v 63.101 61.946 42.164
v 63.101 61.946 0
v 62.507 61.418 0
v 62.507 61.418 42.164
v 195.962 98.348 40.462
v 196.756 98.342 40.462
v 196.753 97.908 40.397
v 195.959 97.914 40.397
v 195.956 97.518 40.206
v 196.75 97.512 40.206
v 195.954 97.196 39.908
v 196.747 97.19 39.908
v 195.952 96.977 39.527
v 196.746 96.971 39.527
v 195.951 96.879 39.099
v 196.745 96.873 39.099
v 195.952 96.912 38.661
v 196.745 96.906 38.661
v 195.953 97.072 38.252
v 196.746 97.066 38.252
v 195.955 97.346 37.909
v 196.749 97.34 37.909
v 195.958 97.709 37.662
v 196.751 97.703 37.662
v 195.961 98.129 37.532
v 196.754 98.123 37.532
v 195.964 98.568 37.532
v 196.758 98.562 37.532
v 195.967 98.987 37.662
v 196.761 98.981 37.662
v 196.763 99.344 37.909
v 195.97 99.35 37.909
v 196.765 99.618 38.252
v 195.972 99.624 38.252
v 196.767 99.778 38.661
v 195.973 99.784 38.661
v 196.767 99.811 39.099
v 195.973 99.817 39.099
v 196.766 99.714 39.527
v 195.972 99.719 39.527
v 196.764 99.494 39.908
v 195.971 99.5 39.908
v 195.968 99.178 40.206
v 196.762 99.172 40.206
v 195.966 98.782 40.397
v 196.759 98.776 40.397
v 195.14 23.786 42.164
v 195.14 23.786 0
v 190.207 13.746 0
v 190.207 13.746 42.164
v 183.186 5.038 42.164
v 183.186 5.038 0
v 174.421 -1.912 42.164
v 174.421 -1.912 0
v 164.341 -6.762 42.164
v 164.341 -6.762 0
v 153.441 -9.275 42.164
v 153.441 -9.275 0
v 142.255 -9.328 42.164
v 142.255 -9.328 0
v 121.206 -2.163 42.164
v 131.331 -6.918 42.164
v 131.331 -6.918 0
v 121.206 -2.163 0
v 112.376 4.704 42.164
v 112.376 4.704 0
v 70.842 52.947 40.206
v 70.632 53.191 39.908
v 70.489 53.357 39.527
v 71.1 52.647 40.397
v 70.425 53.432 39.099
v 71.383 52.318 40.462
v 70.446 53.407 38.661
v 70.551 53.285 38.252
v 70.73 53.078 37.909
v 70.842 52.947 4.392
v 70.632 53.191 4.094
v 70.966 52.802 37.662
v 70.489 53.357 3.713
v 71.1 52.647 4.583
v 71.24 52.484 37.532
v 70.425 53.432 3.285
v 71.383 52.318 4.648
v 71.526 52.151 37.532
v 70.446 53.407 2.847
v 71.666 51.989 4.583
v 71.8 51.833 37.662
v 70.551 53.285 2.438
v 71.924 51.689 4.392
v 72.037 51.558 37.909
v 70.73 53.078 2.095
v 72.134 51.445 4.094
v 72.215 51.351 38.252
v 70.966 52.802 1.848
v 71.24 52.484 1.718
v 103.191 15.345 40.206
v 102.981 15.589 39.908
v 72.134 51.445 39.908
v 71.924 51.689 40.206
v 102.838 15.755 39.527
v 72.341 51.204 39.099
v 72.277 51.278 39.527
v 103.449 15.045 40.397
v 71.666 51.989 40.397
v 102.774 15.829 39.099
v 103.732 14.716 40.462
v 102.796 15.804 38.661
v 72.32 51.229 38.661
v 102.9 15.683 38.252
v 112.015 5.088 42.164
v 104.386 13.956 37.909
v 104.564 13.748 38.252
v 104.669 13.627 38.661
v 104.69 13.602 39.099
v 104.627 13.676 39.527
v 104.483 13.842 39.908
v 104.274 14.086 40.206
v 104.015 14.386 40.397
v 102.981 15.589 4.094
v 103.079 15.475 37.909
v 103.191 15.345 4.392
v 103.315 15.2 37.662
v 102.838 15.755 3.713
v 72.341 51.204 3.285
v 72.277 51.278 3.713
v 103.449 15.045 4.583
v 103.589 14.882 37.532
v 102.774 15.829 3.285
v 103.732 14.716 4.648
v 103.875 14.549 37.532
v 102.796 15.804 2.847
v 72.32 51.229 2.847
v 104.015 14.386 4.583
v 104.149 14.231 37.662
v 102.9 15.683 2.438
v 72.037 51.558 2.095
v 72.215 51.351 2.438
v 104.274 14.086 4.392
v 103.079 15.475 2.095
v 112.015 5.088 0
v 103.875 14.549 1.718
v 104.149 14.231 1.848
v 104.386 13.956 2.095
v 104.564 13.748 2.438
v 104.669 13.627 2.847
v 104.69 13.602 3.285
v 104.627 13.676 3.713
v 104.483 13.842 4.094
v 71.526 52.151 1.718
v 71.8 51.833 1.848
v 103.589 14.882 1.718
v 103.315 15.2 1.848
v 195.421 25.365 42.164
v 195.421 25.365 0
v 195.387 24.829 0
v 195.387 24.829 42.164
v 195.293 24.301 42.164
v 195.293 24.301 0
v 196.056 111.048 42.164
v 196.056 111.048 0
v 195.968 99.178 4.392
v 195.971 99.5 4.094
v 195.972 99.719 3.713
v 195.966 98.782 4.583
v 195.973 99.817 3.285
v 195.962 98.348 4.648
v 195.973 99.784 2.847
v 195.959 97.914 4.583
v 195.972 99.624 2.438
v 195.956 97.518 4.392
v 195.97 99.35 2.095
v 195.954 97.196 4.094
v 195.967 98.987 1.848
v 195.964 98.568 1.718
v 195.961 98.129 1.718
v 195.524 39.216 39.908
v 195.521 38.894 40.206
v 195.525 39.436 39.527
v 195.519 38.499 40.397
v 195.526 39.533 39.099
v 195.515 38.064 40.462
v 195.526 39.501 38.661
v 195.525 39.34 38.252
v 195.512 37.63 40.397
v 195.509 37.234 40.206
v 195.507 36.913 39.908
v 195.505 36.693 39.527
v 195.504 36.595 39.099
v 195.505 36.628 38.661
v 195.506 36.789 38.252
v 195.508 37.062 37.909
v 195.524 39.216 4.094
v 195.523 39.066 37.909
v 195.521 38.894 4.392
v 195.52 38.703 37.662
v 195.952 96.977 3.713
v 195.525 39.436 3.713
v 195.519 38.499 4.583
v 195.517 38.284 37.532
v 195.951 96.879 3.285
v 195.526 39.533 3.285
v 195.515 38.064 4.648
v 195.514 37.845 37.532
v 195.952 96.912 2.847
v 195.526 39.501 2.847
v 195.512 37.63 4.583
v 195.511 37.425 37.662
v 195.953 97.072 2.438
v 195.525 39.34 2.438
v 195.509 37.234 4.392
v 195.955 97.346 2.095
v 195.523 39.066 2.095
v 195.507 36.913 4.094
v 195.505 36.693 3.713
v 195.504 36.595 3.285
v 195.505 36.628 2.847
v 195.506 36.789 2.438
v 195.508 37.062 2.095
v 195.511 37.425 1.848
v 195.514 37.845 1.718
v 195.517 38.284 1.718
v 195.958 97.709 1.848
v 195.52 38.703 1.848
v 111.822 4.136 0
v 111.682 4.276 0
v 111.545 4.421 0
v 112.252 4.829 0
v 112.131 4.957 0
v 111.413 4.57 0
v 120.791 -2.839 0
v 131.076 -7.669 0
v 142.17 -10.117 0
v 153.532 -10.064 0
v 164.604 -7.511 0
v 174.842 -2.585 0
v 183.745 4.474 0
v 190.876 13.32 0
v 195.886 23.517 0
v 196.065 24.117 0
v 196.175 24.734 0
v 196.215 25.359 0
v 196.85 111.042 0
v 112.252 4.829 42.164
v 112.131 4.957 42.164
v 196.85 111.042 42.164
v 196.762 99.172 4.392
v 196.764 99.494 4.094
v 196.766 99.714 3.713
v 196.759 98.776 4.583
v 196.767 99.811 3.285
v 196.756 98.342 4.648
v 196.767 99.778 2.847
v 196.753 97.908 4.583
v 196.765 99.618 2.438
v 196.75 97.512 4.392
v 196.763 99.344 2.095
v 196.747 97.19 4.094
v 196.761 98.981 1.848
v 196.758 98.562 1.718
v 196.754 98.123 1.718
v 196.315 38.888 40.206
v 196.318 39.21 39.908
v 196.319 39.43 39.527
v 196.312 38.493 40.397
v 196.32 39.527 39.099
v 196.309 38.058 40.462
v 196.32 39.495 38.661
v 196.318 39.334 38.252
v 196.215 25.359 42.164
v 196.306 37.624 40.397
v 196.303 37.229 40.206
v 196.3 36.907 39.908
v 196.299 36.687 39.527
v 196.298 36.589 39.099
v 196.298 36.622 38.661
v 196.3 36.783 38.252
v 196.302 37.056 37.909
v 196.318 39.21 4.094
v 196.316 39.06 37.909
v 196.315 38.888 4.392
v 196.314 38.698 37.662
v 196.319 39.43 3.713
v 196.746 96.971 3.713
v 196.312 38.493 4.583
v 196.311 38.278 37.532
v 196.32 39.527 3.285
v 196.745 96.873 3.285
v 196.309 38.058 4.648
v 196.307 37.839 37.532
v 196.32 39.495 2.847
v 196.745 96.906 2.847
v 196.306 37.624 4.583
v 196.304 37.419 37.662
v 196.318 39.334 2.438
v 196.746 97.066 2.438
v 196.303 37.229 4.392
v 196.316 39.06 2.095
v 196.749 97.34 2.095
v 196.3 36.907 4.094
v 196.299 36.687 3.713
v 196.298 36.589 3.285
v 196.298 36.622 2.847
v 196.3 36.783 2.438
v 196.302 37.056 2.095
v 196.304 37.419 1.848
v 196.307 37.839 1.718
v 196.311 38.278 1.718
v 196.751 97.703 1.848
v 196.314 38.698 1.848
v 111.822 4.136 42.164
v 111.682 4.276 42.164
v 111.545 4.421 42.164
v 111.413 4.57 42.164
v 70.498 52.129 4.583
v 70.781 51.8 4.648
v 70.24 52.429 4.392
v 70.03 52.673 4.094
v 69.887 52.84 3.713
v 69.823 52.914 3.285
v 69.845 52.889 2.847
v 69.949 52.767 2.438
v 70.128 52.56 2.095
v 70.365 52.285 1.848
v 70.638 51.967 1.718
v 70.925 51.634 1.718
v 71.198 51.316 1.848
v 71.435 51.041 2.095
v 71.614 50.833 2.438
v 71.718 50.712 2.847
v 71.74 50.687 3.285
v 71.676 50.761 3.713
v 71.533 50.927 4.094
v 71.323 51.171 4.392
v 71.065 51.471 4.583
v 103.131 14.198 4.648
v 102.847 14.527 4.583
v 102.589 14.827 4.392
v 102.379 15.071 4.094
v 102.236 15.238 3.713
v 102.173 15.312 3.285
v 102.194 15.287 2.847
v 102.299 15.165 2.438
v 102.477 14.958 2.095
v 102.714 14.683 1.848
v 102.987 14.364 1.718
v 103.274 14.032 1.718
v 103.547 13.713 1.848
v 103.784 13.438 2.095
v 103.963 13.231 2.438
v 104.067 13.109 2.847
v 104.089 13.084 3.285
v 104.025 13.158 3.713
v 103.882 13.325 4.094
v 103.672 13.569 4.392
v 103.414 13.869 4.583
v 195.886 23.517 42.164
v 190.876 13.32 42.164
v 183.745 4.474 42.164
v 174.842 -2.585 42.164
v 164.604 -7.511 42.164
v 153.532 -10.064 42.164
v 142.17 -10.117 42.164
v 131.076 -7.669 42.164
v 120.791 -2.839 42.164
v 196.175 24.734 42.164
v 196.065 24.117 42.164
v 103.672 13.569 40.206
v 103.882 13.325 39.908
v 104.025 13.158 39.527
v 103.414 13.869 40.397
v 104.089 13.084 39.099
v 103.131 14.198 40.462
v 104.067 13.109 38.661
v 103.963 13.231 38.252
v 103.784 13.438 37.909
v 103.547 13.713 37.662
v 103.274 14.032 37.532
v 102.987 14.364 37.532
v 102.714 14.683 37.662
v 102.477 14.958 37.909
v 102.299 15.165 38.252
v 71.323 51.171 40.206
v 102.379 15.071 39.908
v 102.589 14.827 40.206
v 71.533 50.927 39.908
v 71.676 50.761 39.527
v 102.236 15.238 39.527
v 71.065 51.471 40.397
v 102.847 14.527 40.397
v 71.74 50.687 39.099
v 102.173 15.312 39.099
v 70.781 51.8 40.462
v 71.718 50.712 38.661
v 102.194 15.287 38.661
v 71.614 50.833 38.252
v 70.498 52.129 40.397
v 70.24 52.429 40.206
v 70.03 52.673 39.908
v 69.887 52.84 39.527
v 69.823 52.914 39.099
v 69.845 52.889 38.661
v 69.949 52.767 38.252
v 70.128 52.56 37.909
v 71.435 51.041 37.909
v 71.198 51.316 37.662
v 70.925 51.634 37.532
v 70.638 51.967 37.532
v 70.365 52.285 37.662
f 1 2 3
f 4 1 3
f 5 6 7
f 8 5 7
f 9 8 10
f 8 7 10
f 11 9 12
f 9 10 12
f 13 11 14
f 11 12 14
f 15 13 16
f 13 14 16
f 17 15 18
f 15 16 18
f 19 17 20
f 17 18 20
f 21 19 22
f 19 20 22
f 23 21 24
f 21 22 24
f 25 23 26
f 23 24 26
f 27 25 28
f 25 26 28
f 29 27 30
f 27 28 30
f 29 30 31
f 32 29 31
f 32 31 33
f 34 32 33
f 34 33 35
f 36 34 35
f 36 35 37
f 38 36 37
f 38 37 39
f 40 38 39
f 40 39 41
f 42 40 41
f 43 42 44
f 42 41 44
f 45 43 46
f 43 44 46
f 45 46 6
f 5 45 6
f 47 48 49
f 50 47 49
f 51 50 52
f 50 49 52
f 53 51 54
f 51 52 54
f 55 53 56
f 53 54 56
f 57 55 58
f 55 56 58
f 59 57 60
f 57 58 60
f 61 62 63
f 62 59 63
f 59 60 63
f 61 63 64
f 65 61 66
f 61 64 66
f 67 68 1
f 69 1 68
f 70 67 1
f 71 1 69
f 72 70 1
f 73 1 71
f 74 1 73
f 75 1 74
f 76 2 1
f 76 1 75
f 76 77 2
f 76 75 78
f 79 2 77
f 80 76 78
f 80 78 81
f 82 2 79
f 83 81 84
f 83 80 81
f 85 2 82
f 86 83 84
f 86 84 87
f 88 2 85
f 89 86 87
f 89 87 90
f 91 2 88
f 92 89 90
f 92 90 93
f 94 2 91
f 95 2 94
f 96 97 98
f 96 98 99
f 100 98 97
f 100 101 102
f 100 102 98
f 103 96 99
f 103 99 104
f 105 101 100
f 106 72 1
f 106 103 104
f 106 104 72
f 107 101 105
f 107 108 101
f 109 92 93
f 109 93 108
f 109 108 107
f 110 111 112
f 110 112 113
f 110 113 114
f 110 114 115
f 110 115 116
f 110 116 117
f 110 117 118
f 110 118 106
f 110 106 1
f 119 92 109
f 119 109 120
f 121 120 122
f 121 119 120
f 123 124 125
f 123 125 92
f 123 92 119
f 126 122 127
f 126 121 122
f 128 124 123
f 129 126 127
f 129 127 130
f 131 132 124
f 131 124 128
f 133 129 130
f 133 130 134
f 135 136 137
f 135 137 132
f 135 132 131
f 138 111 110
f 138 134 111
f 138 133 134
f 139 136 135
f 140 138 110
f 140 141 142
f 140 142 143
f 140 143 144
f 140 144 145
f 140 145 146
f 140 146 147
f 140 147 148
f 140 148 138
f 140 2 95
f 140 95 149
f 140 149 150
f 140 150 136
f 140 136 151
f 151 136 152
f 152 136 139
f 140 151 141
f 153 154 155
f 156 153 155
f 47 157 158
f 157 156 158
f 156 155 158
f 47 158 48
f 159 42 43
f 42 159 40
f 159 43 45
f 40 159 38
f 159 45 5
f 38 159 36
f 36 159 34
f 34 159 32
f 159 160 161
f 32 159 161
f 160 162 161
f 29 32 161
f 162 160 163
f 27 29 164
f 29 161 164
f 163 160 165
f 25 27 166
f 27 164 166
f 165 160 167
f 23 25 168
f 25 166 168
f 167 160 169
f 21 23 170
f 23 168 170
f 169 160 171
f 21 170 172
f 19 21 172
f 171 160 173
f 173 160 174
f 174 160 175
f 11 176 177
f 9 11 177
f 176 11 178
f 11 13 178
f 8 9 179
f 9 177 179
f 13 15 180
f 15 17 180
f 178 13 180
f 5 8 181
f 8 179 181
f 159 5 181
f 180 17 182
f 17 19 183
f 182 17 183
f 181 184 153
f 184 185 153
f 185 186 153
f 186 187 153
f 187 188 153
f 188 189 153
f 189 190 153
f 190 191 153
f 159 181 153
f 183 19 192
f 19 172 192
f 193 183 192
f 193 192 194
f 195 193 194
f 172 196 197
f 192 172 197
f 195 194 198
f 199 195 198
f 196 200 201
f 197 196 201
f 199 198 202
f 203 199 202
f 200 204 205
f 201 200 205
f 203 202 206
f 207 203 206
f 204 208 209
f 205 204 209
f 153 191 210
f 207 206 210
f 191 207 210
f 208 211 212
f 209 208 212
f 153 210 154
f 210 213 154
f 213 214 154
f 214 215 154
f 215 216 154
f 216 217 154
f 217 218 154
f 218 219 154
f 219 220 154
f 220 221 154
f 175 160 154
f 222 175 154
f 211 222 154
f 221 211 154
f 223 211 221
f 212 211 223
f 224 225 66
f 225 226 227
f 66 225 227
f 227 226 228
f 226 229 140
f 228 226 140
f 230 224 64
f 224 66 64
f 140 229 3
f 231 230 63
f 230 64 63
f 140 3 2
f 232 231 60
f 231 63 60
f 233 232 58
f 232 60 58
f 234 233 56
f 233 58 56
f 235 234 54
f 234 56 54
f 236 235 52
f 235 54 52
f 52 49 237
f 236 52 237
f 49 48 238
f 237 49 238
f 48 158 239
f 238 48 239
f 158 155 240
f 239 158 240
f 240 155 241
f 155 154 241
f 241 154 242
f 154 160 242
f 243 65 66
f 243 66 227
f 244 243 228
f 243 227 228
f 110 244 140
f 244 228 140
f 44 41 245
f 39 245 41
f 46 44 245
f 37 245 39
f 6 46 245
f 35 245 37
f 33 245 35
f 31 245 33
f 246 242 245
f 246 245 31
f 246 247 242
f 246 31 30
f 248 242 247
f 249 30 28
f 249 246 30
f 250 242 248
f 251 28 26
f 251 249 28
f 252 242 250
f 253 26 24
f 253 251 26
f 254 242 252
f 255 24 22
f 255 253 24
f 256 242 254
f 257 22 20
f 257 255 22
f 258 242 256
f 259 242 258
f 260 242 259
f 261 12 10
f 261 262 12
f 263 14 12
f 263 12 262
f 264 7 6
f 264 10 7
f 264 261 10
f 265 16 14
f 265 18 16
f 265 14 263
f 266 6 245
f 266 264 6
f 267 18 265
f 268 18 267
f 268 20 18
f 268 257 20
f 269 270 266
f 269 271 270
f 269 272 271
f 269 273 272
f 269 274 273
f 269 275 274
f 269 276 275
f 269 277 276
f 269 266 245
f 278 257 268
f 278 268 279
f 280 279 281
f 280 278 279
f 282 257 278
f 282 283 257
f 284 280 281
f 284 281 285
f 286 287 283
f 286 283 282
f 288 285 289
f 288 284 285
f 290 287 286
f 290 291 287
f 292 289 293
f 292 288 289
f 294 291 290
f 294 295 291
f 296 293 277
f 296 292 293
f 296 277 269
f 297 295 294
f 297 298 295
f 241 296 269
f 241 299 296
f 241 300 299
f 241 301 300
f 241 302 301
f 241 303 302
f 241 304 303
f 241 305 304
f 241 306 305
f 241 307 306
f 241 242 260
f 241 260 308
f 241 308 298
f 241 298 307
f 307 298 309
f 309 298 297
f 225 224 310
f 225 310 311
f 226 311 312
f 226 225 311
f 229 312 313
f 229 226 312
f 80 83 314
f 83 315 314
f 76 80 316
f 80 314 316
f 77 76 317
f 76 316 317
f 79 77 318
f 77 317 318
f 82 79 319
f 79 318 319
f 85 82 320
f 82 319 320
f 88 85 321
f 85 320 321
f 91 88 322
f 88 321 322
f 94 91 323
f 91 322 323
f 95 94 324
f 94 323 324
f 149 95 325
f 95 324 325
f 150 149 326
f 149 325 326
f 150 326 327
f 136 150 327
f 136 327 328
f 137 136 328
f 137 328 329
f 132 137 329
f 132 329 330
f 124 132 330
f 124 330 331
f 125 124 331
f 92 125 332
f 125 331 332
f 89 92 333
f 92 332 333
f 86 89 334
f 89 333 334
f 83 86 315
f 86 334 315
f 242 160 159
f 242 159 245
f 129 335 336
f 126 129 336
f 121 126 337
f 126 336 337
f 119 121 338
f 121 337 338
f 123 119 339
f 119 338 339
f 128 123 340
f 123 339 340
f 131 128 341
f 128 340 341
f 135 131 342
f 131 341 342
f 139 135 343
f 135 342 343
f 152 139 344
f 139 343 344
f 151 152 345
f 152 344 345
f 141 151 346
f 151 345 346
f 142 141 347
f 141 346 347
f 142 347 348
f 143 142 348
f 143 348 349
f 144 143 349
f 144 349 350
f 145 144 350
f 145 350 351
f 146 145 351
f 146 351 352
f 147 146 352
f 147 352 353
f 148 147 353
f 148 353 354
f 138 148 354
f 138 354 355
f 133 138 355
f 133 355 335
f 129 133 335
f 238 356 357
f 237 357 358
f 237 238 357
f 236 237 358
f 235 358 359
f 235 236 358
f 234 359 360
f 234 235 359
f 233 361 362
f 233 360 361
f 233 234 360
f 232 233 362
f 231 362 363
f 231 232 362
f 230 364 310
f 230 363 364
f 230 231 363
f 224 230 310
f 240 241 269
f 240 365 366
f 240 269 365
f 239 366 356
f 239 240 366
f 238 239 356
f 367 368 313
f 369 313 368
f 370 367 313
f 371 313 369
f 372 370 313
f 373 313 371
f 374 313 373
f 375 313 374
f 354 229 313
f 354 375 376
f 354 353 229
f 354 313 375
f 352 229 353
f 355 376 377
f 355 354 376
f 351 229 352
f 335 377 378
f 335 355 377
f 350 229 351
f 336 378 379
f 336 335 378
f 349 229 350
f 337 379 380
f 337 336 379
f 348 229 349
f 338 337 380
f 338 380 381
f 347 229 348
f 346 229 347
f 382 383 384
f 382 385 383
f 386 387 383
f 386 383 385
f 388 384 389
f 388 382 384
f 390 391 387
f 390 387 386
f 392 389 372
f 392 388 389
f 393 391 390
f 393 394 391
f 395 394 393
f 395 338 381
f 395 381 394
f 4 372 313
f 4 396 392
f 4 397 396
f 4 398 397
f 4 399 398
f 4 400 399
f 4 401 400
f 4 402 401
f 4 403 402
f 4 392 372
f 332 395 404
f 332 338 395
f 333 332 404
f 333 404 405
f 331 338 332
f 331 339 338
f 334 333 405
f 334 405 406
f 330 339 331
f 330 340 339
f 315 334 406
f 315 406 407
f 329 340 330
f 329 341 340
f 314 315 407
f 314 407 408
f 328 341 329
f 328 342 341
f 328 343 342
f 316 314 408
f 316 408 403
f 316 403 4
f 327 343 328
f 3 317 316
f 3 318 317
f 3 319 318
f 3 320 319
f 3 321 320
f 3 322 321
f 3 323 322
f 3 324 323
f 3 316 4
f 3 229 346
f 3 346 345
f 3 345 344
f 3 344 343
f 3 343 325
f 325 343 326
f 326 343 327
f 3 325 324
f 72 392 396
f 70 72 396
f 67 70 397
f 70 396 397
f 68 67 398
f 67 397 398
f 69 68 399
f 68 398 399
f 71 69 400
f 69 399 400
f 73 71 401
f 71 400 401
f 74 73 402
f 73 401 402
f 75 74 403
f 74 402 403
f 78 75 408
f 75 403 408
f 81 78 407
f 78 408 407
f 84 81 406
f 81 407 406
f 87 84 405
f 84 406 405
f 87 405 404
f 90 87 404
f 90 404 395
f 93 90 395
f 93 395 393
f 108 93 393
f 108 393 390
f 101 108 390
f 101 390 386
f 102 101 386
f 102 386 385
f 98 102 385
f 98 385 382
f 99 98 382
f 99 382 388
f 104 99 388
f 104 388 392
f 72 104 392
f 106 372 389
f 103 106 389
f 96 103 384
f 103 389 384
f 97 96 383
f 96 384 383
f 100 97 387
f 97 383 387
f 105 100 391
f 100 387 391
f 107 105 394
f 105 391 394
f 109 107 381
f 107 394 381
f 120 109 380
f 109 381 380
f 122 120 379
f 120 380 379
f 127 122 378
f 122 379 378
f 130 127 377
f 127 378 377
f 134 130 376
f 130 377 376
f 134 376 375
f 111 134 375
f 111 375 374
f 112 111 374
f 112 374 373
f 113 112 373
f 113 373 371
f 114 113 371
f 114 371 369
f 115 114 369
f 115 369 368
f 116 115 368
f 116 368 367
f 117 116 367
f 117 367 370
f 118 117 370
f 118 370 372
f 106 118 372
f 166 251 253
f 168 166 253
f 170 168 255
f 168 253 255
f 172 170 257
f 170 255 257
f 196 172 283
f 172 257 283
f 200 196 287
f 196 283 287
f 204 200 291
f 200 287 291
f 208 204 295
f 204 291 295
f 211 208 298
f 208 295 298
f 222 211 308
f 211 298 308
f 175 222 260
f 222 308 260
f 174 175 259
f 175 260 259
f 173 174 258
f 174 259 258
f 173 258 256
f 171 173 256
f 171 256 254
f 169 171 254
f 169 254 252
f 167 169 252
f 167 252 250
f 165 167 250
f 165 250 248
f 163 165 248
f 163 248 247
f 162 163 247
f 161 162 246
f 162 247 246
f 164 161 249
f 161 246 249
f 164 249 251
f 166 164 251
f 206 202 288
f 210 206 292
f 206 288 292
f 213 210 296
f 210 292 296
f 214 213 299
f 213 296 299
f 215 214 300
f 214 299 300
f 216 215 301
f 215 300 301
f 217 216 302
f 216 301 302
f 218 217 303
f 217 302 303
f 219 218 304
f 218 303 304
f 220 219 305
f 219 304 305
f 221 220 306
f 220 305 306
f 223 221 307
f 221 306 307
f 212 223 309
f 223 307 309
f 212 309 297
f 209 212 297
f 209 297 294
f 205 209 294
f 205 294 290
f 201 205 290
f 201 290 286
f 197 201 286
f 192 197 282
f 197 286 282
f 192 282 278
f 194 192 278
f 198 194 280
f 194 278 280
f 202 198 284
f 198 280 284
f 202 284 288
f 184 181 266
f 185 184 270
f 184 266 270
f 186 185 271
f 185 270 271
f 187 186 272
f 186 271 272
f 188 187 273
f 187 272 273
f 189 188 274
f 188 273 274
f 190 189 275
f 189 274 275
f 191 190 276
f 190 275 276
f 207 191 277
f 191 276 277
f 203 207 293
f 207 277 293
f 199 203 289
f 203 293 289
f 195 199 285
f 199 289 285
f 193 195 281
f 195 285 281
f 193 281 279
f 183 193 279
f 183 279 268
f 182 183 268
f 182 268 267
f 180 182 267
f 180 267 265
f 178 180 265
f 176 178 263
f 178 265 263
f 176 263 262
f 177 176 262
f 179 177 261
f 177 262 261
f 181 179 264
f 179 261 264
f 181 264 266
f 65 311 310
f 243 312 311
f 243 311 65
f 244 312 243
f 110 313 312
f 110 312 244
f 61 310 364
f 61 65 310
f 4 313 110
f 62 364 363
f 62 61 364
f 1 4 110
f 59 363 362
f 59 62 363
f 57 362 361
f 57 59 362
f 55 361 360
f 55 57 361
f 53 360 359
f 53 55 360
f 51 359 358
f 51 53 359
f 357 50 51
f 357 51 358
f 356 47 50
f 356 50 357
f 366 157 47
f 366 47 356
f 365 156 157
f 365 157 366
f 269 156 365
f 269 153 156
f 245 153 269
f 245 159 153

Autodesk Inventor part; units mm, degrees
ref_plane "YZ Plane" through (0, 0, 0) normal (1, 0, 0) x (0, 1, 0)
ref_plane "XZ Plane" through (0, 0, 0) normal (0, 1, 0) x (-1, 0, 0)
ref_plane "XY Plane" through (0, 0, 0) normal (0, 0, 1) x (1, 0, 0)
sketch "Sketch1" plane through (0, 0, 0) normal (0, 0, 1) x (1, 0, 0)
  arc A0 (66.7702, 112.6298) -> (73.6141, 138.1061) centre (52.5264, 130.1136) ccw construction
  line L0 (63.1006, 61.9455) -> (112.0149, 5.088)
  arc A1 (66.7702, 112.6298) -> (63.1006, 61.9455) centre (88.8254, 85.558) ccw construction
  arc A2 (138.8831, 162.8706) -> (162.2319, 146.2144) centre (163.0457, 172.0484) ccw construction
  arc A3 (172.0845, 144.47) -> (162.2319, 146.2144) centre (161.1324, 111.3067) ccw construction
  line L1 (196.0564, 111.0477) -> (195.4211, 25.3647)
  arc A4 (112.0149, 5.088) -> (112.3757, 4.7043) centre (116.5302, 8.9726) ccw
  arc A5 (112.3757, 4.7043) -> (195.1395, 23.7862) centre (147.6111, 40.9044) ccw
  arc A6 (195.1395, 23.7862) -> (195.4211, 25.3647) centre (190.6588, 25.4) ccw
  arc A7 (196.0564, 111.0477) -> (172.0845, 144.47) centre (161.1324, 111.3067) ccw construction
  arc A8 (138.8831, 162.8706) -> (73.6141, 138.1061) centre (105.8063, 151.6542) ccw construction
  line L2 (111.4132, 4.5704) -> (62.5072, 61.4182)
  arc A9 (66.2689, 113.2452) -> (62.5072, 61.4182) centre (88.8254, 85.558) ccw construction
  arc A10 (66.2689, 113.2452) -> (72.8769, 137.8116) centre (52.5264, 130.1136) ccw construction
  arc A11 (139.6302, 163.1392) -> (72.8769, 137.8116) centre (105.8063, 151.6542) ccw construction
  arc A12 (139.6302, 163.1392) -> (162.2569, 147.0077) centre (163.0457, 172.0484) ccw construction
  arc A13 (172.3334, 145.2237) -> (162.2569, 147.0077) centre (161.1324, 111.3067) ccw construction
  arc A14 (196.8501, 111.0418) -> (172.3334, 145.2237) centre (161.1324, 111.3067) ccw construction
  line L3 (196.8501, 111.0418) -> (196.2148, 25.3588)
  arc A15 (195.8863, 23.5172) -> (196.2148, 25.3588) centre (190.6588, 25.4) ccw
  arc A16 (111.8221, 4.1355) -> (195.8863, 23.5172) centre (147.6111, 40.9044) ccw
  arc A17 (111.4132, 4.5704) -> (111.8221, 4.1355) centre (116.5302, 8.9726) ccw
  line L4 (196.0564, 111.0477) -> (196.8501, 111.0418)
  line L5 (63.1006, 61.9455) -> (62.5072, 61.4182)
  point P0 (0, 0)
  point P1 (93.7791, 184.445)
  point P2 (71.0776, 147.9379)
  point P3 (60.2024, 105.5589)
  point P4 (195.6522, 56.526)
  point P5 (134.0244, 172.2363)
  dimension "d0" = 0.7937
extrude "Extrusion1" add sketch "Sketch1" along normal blind 42.164
sketch "Sketch2" plane through (63.1006, 61.9455, 42.164) normal (0.7580738, 0.6521688, 0) x (0, 0, -1)
  line L0 (42.164, 0) -> (42.164, -75.0025) projected
  line L1 (42.164, 0) -> (0, 0) projected
  line L2 (0, -75.0025) -> (0, 0) projected
  line L3 (42.164, -75.0025) -> (0, -75.0025) projected
  line L4 (3.175, 0) -> (3.175, -75.0025) construction
  line L5 (38.989, 0) -> (38.989, -75.0025) construction
  line L6 (42.164, -62.3025) -> (0, -62.3025) construction
  line L7 (0, -12.7) -> (42.164, -12.7) construction
  point P0 (42.164, -5.807)
  point P1 (3.175, -12.7)
  point P2 (38.989, -12.7)
  point P3 (3.175, -62.3025)
  point P4 (38.989, -62.3025)
  dimension "d4" = 3.175
  dimension "d5" = 3.175
  dimension "d6" = 12.7
  dimension "d7" = 12.7
hole "Hole1" at (71.3831, 52.3179, 38.989) at (71.3831, 52.3179, 3.175) at (103.7323, 14.7156, 38.989) at (103.7323, 14.7156, 3.175) direction (-0.7580738, -0.6521688, 0) diameter 2.9464 depth 25.4 tip angle 118 clearance for "Socket Head Cap Screw" size "#4" standard "Ansi Unified Screw Threads"
sketch "Sketch3" plane through (195.4211, 25.3647, 0) normal (-0.9999725, 0.0074143, 0) x (0, 0, 1)
  line L0 (0, 0) -> (0, 85.6854) projected
  line L1 (0, 0) -> (42.164, 0) projected
  line L2 (42.164, 85.6854) -> (42.164, 0) projected
  line L3 (0, 85.6854) -> (42.164, 85.6854) projected
  line L4 (3.175, 85.6854) -> (3.175, 0) construction
  line L5 (0, 12.7) -> (42.164, 12.7) construction
  line L6 (38.989, 85.6854) -> (38.989, 0) construction
  line L7 (0, 72.9854) -> (42.164, 72.9854) construction
  point P0 (0, -26.8129)
  point P1 (3.175, 72.9854)
  point P2 (38.989, 72.9854)
  point P3 (38.989, 12.7)
  point P4 (3.175, 12.7)
  dimension "d15" = 3.175
  dimension "d16" = 3.175
  dimension "d17" = 12.7
  dimension "d18" = 12.7
hole "Hole2" at (195.9623, 98.3481, 3.175) at (195.9623, 98.3481, 38.989) at (195.5153, 38.0643, 38.989) at (195.5153, 38.0643, 3.175) direction (0.9999725, -0.0074143, 0) diameter 2.9464 depth 25.4 tip angle 118 clearance for "Socket Head Cap Screw" size "#4" standard "Ansi Unified Screw Threads"
equation "\"d5\" = d4"
properties part number "Sheild"
